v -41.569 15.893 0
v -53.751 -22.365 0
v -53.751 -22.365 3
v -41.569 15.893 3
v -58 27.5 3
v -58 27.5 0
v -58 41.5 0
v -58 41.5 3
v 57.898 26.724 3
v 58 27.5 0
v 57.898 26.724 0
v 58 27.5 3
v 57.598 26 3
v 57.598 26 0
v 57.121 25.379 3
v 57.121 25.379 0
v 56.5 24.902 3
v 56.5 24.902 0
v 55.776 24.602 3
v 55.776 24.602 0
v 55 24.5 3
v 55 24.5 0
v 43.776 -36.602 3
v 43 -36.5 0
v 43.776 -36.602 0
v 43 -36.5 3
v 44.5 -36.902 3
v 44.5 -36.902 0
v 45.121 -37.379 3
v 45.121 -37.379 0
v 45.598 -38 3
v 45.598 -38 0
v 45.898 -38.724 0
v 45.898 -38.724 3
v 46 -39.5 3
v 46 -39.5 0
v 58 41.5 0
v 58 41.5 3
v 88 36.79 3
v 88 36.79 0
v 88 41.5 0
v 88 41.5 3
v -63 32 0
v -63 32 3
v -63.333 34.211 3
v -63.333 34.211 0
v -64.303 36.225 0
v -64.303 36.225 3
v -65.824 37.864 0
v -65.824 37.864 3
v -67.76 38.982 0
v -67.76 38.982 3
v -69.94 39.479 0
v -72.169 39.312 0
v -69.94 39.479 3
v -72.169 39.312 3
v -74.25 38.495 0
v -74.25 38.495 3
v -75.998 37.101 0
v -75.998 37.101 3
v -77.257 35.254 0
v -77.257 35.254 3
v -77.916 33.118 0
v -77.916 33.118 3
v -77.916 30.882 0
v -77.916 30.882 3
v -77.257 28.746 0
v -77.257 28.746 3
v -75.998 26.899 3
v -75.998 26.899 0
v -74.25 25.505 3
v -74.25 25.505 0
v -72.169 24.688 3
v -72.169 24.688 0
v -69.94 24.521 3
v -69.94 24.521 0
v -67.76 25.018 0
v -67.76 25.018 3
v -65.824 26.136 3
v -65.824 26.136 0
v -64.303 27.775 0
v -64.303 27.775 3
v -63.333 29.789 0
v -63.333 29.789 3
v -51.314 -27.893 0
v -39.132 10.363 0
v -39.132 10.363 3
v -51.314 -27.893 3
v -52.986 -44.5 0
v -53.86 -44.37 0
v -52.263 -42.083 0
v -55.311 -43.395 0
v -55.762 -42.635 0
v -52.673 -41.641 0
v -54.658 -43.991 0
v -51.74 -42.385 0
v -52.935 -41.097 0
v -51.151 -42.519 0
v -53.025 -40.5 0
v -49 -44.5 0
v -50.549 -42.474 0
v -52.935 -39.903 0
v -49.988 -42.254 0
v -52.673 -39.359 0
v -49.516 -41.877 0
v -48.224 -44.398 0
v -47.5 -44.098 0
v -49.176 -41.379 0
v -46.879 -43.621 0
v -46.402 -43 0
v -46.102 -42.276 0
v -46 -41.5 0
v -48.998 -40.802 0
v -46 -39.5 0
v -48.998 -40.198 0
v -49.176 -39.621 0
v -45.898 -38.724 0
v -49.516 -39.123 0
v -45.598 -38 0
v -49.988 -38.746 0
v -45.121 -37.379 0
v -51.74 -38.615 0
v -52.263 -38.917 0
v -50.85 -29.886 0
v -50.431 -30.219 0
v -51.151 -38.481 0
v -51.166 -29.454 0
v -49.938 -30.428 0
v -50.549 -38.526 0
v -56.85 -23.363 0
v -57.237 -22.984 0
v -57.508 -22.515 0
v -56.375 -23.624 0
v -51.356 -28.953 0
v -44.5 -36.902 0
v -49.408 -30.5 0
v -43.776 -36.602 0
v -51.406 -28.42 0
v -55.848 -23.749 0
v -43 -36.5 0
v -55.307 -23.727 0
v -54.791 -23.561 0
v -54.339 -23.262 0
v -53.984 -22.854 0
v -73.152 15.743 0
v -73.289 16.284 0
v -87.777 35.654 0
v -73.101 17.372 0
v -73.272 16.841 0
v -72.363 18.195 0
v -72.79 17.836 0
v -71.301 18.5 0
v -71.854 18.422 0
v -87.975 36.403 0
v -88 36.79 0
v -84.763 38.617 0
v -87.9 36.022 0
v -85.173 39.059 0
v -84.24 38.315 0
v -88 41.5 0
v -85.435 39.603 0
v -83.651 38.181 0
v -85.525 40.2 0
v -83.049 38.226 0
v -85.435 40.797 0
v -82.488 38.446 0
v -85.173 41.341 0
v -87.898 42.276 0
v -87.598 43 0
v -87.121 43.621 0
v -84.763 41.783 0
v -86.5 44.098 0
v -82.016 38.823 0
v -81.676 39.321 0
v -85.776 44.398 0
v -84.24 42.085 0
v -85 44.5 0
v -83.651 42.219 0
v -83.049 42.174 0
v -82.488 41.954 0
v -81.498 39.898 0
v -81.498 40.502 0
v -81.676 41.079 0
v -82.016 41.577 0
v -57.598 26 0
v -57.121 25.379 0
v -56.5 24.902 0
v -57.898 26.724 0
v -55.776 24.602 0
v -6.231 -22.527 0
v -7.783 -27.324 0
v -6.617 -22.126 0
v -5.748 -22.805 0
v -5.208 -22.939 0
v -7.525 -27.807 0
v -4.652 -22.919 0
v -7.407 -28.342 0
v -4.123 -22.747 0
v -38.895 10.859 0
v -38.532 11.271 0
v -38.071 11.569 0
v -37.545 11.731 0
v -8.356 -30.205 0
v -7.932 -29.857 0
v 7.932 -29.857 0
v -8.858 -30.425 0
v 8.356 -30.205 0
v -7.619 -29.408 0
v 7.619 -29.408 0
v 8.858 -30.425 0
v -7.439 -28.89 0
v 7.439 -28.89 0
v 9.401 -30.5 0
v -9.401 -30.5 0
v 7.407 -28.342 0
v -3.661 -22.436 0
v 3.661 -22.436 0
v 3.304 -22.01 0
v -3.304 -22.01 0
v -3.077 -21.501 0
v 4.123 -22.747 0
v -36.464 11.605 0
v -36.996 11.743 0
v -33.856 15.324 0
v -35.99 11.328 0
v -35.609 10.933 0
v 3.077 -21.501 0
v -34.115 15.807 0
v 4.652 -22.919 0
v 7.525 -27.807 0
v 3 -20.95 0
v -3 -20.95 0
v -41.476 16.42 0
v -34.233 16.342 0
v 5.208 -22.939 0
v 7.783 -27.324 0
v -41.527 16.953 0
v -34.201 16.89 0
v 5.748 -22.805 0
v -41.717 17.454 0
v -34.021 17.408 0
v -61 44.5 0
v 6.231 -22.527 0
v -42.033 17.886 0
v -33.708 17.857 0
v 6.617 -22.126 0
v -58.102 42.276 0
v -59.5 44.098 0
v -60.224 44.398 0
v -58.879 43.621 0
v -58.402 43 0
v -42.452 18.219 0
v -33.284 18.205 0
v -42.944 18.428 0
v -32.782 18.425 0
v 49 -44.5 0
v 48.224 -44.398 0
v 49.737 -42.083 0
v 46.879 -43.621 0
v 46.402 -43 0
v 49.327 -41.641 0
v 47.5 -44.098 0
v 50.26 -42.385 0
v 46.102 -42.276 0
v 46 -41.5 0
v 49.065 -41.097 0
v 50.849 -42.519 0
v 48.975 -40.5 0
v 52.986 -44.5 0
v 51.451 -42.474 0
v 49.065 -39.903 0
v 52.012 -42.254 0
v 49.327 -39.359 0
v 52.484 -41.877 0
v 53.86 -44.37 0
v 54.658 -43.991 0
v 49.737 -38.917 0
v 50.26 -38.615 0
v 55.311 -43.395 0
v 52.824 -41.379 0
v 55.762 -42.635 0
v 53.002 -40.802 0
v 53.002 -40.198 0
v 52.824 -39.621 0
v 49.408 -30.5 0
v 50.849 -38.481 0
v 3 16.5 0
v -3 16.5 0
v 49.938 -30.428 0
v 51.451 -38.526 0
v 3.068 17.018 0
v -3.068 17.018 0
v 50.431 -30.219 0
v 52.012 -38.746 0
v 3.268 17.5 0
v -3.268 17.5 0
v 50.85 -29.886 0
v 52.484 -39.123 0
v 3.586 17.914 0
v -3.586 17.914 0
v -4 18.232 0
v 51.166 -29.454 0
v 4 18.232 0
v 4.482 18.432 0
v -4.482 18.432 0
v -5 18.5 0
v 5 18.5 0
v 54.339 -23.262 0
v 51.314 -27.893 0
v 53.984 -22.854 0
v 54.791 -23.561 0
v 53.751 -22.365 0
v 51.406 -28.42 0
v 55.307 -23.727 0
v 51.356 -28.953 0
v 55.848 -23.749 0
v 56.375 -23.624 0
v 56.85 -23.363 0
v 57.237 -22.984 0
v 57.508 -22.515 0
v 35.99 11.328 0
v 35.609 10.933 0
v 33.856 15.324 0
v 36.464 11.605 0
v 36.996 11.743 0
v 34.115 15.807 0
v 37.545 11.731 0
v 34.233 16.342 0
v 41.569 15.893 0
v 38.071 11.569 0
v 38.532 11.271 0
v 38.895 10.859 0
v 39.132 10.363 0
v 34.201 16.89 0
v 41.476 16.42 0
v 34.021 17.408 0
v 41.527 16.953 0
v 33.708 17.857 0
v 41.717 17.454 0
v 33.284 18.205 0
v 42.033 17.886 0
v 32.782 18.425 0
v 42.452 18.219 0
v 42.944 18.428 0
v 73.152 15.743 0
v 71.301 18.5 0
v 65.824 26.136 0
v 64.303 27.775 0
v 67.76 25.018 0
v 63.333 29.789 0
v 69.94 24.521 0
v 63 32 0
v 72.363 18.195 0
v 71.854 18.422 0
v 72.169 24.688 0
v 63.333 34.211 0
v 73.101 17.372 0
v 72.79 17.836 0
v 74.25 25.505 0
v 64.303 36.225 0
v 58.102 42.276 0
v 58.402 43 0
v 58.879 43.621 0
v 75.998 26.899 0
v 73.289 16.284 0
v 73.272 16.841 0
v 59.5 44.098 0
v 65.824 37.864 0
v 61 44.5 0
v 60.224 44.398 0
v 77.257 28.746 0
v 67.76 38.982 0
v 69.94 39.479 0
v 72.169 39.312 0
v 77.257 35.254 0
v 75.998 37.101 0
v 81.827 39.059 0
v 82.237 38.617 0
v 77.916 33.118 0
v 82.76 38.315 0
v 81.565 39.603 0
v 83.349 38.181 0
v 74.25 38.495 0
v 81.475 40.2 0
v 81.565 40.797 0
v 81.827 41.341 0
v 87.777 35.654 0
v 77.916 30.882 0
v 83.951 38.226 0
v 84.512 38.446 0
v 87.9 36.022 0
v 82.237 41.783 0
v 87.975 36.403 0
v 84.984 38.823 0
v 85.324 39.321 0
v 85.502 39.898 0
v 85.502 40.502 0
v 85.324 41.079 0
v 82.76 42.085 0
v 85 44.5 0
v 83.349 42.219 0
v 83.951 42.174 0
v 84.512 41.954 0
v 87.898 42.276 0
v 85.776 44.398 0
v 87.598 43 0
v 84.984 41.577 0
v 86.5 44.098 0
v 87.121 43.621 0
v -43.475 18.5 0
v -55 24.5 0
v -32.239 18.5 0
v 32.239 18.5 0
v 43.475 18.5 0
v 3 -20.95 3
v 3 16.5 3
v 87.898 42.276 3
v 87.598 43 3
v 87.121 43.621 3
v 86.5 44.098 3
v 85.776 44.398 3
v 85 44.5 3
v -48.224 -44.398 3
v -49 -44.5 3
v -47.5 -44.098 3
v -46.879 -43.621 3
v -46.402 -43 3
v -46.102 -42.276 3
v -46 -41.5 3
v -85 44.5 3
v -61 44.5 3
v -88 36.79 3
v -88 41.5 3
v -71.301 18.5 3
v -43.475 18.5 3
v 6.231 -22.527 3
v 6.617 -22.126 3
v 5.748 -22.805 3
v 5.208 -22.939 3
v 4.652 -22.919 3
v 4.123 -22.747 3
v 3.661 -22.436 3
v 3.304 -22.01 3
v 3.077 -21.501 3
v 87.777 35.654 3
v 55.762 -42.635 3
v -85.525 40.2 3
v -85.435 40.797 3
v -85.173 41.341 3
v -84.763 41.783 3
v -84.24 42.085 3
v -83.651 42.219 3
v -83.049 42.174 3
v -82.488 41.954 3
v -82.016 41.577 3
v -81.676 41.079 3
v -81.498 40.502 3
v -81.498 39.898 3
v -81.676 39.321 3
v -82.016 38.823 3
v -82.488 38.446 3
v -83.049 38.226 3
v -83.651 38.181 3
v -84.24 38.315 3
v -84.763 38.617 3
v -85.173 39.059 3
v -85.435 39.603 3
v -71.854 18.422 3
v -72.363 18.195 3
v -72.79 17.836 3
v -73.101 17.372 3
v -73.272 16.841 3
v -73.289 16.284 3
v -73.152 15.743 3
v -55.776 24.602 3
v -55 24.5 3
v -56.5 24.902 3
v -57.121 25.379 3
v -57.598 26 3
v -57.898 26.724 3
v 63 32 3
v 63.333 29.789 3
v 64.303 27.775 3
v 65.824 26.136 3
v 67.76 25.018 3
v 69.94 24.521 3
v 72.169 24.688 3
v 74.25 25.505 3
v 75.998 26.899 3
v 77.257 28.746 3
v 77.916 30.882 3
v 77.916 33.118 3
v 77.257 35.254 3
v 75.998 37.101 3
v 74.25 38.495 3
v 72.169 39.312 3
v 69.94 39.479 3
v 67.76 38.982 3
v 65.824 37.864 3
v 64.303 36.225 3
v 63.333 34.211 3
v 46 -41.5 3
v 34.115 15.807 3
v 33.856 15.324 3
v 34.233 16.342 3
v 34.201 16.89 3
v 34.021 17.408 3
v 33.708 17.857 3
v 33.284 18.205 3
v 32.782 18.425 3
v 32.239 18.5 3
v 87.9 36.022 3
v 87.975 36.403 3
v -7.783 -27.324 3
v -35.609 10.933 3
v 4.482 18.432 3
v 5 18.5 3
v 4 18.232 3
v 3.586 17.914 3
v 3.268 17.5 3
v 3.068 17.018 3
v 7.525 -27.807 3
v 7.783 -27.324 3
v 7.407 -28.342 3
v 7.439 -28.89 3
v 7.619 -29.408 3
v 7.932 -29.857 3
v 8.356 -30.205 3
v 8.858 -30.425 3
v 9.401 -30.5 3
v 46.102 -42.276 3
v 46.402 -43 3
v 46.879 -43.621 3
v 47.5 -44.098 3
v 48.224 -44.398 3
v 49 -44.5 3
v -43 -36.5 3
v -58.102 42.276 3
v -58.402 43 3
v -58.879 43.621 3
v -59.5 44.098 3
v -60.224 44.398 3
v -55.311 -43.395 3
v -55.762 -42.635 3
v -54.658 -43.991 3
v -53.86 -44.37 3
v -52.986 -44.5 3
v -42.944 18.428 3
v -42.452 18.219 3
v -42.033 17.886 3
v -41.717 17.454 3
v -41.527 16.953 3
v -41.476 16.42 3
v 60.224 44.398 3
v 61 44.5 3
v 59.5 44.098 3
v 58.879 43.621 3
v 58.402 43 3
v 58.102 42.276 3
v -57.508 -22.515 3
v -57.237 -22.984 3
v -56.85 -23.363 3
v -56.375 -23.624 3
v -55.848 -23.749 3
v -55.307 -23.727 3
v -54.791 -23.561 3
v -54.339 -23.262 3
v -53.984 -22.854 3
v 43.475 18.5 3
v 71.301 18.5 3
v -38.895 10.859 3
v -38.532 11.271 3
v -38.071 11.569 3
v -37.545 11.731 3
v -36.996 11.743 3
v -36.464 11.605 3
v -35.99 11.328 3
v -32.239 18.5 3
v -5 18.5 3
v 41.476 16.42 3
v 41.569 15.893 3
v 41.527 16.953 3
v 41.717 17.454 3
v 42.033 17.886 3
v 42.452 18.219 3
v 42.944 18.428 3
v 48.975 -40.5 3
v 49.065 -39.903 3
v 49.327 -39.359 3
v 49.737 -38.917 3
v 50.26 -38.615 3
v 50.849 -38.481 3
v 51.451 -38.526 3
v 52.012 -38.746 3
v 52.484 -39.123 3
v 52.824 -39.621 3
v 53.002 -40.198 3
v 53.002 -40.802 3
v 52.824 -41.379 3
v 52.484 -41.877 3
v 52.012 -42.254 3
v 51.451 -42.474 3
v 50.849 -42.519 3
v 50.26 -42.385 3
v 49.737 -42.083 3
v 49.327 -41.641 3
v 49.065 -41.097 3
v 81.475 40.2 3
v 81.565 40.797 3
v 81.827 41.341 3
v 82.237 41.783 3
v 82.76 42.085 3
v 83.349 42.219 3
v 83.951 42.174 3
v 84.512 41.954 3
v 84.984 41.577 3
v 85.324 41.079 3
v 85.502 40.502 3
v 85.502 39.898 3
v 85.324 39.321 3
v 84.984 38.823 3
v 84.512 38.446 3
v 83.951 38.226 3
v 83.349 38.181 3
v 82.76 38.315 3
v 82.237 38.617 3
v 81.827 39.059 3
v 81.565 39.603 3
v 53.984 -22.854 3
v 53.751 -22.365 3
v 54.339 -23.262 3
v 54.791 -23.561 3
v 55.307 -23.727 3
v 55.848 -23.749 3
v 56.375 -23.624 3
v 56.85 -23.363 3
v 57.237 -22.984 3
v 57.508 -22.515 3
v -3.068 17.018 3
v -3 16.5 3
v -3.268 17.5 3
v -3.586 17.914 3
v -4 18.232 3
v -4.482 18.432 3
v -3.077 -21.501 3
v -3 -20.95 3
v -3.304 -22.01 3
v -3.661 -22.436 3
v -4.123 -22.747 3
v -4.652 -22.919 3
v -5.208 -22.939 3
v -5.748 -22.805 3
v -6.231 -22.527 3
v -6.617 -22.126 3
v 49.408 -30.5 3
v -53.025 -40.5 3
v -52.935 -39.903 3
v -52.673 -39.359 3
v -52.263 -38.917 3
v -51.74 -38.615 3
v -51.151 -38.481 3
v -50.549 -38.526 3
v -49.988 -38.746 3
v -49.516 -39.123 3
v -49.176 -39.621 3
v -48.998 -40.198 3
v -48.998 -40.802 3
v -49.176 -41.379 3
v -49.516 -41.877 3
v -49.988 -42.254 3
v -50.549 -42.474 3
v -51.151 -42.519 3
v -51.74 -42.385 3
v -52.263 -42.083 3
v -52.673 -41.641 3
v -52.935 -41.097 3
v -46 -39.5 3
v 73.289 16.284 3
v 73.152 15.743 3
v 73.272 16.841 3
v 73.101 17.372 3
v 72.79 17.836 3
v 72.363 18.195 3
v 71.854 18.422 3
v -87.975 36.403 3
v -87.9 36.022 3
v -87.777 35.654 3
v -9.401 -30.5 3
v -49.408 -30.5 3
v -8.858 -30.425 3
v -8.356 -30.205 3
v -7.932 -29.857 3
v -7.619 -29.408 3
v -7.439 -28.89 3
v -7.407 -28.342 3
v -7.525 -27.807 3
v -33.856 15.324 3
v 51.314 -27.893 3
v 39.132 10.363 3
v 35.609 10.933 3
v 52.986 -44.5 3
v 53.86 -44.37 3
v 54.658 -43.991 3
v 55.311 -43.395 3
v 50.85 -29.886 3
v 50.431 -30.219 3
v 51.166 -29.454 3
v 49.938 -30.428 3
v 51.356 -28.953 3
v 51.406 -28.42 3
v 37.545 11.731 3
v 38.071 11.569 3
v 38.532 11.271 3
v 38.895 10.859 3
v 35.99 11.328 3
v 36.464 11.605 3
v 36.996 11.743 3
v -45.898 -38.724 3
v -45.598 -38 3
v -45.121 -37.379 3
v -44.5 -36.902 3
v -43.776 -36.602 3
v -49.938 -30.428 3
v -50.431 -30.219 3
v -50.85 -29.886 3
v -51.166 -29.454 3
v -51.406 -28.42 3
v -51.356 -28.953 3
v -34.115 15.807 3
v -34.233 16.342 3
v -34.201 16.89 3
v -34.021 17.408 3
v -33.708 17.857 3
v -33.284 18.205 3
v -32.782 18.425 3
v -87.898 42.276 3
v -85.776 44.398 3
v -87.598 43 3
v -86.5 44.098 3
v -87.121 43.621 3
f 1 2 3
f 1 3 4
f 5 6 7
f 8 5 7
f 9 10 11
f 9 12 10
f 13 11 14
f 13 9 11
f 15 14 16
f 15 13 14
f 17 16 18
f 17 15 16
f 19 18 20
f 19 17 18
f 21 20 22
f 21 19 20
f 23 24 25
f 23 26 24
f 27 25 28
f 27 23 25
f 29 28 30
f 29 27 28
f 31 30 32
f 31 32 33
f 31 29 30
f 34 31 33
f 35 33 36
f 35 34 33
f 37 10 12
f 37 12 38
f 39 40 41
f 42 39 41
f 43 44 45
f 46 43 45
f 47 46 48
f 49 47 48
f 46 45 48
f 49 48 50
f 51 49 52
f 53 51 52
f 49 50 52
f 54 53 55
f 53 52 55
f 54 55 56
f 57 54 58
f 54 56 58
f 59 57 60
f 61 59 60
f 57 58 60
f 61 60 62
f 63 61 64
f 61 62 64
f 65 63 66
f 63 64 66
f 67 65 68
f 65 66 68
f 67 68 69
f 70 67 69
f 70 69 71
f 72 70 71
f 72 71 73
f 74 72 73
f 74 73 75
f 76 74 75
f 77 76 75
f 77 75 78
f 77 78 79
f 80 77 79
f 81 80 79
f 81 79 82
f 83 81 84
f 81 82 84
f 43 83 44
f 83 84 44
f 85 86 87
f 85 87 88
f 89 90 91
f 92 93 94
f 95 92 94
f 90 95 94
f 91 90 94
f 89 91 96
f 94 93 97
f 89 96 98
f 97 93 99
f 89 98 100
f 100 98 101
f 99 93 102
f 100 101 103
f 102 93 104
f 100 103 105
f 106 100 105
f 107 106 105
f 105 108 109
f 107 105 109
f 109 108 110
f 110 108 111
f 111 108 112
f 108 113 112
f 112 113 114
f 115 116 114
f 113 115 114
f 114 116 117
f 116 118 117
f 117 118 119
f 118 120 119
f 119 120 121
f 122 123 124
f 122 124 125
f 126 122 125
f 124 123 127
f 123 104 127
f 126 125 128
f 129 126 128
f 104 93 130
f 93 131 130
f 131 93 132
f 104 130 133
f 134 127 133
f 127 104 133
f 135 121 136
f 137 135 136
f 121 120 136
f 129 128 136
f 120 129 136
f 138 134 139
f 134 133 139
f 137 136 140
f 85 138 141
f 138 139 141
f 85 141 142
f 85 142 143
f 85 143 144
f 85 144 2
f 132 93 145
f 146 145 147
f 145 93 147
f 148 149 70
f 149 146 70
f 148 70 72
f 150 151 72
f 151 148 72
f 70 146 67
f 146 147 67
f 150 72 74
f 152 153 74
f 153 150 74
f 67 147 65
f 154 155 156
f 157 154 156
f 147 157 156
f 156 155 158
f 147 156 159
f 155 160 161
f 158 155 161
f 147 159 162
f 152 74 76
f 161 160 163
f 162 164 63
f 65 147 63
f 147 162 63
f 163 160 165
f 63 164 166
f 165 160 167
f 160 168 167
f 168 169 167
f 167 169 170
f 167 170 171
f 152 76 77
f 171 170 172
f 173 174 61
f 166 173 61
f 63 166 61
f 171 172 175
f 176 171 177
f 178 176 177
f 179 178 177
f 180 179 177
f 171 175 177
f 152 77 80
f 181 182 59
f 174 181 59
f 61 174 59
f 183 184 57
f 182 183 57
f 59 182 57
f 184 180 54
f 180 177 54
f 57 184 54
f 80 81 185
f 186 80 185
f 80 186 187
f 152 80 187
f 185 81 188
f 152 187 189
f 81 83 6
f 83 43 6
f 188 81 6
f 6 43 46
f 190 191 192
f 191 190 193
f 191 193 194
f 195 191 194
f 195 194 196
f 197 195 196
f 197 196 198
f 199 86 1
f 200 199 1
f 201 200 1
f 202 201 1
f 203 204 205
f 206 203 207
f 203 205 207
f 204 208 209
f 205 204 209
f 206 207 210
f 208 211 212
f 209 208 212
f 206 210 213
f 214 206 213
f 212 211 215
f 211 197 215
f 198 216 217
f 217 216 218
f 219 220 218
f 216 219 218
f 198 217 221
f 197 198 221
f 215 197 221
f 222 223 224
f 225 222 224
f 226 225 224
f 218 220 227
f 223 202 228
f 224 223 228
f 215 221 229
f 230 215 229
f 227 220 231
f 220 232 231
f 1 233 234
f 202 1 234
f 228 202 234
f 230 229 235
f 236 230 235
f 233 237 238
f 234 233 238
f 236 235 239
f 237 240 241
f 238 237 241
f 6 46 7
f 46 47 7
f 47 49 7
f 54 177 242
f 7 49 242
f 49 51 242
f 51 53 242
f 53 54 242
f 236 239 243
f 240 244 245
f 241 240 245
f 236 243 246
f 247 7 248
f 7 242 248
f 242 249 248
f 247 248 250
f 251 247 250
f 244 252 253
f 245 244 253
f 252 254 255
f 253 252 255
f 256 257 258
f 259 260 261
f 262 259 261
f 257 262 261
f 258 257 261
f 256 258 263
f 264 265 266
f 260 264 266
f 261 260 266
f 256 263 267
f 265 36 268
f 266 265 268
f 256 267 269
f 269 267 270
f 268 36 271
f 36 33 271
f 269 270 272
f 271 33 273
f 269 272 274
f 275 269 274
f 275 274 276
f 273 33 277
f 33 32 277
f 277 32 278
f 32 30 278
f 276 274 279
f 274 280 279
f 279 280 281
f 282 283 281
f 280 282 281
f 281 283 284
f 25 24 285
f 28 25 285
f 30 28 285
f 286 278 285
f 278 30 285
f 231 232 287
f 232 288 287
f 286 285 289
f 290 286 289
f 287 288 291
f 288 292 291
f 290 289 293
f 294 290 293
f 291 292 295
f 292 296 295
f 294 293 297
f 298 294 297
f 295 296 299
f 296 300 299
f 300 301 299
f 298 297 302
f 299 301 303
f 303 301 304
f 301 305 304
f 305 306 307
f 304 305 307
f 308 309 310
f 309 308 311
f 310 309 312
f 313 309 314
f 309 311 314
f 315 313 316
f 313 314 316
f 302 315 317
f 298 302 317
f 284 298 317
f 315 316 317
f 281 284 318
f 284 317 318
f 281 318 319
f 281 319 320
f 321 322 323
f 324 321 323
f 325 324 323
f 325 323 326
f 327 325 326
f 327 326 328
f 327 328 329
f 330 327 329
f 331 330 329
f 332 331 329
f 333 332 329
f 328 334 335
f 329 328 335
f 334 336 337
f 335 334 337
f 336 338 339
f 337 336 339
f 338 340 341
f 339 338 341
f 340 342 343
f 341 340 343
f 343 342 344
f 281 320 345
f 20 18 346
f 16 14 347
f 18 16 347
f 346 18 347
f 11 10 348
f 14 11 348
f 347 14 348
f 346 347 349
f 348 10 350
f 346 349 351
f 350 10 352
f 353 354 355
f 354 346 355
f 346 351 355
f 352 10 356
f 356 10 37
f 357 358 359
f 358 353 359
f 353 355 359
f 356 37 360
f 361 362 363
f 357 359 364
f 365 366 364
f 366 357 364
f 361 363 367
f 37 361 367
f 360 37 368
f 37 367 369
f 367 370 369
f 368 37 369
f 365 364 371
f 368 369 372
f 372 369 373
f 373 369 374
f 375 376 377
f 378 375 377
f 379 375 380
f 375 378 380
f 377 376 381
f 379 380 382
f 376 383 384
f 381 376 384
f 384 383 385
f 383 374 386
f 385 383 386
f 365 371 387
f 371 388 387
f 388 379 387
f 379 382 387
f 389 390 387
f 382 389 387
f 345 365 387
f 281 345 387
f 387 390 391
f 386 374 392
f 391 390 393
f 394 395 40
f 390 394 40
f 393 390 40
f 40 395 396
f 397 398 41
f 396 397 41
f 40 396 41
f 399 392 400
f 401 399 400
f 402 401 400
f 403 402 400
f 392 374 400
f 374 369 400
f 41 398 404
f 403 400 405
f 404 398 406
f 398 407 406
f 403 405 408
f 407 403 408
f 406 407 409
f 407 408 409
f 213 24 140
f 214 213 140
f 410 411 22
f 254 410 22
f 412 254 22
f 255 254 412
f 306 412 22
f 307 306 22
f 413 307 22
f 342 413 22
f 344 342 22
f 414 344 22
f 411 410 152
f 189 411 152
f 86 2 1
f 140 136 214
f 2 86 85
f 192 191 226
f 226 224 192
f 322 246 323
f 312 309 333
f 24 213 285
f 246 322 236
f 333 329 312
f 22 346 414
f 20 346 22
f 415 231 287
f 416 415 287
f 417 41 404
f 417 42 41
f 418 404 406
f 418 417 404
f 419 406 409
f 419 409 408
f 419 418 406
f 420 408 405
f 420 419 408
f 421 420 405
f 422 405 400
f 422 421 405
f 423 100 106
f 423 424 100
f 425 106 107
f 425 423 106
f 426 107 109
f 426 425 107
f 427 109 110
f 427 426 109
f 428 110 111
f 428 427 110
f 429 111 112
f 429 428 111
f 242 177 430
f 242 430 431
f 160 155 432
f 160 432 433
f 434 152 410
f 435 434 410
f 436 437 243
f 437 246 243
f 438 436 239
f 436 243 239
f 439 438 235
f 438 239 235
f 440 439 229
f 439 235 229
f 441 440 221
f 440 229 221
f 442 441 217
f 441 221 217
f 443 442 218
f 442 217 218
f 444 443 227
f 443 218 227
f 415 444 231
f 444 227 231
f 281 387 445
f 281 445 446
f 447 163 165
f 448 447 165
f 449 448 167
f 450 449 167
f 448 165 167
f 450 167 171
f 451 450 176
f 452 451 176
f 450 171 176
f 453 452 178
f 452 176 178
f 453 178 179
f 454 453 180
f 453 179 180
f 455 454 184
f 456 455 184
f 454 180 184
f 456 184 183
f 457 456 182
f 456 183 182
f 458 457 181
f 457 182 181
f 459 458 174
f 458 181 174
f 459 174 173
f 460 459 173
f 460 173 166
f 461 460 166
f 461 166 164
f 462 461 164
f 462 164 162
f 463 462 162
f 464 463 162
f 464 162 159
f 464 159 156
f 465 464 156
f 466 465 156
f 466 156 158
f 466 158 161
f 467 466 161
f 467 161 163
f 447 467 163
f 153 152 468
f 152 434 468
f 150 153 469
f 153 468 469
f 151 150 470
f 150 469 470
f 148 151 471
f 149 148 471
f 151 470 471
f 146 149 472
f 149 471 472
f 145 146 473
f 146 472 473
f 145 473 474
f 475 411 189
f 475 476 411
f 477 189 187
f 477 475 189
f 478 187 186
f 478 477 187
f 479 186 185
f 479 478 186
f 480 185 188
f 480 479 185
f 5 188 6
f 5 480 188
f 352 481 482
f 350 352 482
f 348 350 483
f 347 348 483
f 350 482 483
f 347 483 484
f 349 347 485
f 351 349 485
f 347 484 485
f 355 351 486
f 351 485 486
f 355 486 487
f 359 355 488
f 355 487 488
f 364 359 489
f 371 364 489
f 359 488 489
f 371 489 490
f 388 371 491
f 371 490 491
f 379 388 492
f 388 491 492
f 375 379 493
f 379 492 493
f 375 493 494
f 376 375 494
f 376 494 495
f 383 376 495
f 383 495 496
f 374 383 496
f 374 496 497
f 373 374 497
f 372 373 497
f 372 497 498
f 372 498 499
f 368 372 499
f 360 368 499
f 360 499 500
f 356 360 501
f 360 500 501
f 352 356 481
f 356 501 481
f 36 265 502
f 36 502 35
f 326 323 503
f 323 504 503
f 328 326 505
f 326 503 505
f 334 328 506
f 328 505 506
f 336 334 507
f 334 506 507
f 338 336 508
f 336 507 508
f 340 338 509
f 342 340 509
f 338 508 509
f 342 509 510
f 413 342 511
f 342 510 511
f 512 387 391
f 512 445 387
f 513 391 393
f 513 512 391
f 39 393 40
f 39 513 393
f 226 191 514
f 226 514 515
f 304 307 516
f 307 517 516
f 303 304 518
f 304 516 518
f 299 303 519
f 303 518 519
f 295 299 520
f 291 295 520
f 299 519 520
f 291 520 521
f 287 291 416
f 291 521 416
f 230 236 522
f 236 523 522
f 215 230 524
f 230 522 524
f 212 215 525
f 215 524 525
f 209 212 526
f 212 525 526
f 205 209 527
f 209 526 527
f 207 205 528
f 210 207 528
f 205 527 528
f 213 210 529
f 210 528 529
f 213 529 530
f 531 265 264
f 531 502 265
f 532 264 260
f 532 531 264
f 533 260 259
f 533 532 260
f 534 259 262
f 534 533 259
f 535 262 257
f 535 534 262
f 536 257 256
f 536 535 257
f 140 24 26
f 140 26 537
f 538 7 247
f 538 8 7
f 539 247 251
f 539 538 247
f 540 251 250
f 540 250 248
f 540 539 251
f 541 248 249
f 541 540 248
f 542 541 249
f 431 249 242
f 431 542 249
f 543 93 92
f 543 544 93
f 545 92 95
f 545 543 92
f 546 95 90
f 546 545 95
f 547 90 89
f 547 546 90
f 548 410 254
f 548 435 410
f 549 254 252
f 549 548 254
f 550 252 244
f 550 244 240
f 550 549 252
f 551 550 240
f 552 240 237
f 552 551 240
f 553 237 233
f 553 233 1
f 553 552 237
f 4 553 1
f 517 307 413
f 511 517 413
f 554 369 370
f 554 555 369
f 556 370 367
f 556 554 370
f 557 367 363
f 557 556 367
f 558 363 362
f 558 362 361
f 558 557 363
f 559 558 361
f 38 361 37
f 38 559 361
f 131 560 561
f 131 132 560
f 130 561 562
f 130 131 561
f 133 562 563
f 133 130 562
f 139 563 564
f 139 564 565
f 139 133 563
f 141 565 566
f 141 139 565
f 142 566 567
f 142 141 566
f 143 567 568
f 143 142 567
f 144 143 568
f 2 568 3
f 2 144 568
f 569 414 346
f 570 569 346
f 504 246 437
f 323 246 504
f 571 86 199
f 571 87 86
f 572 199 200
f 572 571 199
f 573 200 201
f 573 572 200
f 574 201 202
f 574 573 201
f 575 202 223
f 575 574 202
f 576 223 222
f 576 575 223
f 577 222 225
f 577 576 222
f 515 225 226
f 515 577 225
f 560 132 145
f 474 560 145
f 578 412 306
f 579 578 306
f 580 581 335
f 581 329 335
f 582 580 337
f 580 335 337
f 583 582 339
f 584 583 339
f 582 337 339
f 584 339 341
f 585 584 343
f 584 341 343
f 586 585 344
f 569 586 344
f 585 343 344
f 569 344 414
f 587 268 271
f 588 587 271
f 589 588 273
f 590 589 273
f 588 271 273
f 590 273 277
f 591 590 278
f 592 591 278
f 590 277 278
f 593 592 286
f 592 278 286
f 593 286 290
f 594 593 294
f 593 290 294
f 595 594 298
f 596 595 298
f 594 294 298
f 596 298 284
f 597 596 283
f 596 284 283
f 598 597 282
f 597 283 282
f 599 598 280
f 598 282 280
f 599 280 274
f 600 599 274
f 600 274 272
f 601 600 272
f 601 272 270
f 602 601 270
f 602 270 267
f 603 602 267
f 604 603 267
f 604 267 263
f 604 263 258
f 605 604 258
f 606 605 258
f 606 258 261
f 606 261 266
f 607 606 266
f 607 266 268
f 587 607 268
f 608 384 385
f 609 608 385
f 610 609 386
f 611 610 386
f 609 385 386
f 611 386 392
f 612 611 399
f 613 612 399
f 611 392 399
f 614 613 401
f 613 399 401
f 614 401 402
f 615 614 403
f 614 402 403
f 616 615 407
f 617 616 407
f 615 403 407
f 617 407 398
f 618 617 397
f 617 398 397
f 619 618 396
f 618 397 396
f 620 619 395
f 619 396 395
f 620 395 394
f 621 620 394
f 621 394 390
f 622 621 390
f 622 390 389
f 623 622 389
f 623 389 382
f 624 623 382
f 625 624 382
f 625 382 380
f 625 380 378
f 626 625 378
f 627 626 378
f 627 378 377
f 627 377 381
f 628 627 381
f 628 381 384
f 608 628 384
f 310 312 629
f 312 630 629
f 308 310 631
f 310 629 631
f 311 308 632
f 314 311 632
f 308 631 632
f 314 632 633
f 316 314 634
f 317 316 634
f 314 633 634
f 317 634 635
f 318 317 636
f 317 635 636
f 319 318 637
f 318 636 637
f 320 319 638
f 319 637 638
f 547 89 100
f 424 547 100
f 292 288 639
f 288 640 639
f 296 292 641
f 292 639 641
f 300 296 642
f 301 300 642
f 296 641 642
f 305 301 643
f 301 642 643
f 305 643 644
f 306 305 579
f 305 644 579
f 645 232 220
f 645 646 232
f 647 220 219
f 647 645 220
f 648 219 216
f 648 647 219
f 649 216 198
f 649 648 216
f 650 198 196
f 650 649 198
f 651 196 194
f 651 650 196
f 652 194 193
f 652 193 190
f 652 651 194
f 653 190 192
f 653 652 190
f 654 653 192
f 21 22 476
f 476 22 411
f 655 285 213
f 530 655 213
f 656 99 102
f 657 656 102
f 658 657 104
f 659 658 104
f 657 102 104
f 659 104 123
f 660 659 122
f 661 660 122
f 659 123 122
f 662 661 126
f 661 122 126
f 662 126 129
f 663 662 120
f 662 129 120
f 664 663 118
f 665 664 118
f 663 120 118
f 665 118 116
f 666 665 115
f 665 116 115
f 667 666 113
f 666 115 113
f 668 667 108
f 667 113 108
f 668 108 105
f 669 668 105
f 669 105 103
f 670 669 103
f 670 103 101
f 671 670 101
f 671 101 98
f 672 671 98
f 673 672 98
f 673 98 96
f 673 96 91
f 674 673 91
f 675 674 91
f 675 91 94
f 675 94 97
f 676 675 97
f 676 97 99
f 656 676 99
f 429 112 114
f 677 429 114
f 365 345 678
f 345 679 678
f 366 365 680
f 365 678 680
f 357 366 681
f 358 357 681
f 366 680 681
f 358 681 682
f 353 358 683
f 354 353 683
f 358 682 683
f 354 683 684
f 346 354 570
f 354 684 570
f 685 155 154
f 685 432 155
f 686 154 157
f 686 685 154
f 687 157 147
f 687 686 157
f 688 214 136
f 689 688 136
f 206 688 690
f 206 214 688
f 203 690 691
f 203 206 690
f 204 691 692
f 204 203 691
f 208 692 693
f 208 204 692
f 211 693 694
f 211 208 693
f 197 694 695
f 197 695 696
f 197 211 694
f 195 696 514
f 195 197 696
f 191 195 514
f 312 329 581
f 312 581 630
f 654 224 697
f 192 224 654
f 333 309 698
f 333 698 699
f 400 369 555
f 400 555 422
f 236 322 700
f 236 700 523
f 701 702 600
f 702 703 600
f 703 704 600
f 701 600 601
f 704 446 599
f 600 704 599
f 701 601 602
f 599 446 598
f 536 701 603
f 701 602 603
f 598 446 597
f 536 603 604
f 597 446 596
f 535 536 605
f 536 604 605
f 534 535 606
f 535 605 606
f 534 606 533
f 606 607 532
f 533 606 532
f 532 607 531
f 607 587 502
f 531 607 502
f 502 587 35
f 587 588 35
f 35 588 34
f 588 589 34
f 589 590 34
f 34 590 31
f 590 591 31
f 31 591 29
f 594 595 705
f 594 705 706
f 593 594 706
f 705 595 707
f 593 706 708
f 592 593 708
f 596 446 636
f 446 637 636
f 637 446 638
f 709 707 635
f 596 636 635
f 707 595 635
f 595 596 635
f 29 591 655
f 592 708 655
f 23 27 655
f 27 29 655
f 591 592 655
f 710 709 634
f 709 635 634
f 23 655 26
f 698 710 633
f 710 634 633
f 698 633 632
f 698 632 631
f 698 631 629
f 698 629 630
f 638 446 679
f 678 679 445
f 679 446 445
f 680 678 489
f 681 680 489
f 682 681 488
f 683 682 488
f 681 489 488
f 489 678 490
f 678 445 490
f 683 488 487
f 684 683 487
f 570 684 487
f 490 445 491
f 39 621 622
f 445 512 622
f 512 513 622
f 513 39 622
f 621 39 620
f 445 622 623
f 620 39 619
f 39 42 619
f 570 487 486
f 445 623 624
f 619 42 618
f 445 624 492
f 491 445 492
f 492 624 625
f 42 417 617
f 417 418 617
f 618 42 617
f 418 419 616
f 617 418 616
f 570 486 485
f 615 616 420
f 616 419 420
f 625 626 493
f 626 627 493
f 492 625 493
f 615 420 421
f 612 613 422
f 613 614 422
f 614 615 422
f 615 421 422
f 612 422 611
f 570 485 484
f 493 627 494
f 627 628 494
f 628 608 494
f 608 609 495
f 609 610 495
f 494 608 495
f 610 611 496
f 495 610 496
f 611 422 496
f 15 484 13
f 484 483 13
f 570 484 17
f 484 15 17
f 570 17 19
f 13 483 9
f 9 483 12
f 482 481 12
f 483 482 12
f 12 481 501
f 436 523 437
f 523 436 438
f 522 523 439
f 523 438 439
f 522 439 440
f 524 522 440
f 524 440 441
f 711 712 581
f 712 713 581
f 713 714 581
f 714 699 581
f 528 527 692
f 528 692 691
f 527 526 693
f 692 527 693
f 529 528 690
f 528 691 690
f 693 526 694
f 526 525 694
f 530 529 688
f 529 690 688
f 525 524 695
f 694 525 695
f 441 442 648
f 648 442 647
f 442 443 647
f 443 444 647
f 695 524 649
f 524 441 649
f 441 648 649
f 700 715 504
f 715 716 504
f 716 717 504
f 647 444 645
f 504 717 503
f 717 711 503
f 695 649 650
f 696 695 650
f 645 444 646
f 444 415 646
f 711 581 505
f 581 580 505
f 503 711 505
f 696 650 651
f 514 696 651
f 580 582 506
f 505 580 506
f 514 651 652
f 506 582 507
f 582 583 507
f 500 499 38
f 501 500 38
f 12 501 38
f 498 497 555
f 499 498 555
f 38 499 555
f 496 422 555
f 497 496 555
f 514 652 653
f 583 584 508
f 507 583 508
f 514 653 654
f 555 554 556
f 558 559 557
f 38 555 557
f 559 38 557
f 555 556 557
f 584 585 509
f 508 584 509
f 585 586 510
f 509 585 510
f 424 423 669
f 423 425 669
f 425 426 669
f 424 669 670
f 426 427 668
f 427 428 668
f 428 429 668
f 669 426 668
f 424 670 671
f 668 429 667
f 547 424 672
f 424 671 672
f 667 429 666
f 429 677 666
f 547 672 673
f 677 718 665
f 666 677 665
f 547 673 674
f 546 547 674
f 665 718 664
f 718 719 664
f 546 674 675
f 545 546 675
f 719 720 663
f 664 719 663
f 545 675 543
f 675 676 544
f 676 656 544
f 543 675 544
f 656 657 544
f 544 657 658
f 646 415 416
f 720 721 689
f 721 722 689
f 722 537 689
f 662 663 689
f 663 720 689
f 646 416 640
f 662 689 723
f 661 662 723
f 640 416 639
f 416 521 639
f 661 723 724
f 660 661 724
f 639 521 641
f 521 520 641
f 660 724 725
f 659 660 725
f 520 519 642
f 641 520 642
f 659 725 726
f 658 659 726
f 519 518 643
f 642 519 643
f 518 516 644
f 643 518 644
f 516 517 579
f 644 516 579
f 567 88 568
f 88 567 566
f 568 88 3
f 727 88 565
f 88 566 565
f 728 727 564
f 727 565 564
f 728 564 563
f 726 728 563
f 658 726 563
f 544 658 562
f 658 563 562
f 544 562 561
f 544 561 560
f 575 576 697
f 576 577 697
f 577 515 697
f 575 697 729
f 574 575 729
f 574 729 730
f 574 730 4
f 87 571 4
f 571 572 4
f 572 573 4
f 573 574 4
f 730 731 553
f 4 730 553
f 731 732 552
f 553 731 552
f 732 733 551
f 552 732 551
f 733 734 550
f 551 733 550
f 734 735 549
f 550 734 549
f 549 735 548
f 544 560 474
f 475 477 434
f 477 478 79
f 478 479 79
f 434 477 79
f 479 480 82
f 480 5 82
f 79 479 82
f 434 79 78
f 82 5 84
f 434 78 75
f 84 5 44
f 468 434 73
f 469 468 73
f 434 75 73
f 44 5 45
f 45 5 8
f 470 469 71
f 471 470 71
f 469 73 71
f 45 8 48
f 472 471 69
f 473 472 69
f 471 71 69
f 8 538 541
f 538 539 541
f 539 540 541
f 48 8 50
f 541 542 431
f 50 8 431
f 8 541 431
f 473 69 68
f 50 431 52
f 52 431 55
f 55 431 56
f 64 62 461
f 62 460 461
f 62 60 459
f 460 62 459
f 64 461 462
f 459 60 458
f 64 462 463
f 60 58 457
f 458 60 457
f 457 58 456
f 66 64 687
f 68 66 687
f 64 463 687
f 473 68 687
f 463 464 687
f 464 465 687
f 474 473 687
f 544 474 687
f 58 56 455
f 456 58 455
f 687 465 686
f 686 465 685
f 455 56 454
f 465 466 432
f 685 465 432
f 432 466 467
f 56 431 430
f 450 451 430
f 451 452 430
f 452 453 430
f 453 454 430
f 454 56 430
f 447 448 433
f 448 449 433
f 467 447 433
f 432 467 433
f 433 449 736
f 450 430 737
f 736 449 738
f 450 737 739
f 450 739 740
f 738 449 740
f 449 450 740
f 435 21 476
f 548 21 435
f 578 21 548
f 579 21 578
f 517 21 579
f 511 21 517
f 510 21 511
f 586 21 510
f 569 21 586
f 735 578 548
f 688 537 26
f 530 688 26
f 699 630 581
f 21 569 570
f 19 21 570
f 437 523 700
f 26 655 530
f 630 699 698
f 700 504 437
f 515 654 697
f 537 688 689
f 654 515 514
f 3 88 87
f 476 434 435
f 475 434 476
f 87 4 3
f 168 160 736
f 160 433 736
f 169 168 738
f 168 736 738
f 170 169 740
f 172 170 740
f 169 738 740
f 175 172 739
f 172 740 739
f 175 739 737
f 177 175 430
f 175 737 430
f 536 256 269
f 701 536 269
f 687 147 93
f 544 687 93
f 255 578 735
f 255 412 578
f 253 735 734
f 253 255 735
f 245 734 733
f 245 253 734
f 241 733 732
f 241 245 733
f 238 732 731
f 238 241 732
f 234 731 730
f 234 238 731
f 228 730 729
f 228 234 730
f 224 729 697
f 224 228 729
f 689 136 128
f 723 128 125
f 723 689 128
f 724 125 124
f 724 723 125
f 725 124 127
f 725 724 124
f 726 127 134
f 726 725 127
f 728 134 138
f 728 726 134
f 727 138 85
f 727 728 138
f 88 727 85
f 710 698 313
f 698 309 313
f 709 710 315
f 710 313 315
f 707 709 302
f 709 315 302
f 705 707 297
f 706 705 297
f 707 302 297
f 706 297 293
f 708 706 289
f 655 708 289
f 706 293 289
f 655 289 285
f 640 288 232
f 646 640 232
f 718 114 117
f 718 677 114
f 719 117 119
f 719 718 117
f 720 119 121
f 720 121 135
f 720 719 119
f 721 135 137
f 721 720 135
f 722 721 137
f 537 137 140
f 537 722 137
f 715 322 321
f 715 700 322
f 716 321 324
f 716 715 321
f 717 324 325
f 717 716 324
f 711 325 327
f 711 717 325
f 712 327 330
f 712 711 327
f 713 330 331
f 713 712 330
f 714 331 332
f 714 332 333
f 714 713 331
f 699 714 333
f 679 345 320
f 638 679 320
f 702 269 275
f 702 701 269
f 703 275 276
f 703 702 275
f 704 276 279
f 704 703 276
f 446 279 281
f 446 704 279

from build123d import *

# Parameters (mm, degrees)
SKETCH_1_W          = 176
SKETCH_1_H          = 89
EXTRUDE_1_DEPTH     = 3
SKETCH_2_R          = 2.025
CUT_EXTRUDE_1_DEPTH = 4
CUT_EXTRUDE_2_DEPTH = 4
SKETCH_4_W          = 116
SKETCH_4_H          = 40
CUT_EXTRUDE_3_DEPTH = 4
SKETCH_5_W          = 92
SKETCH_5_H          = 16
CUT_EXTRUDE_4_DEPTH = 4
CUT_EXTRUDE_5_DEPTH = 24
EXTRUDE_2_DEPTH     = 3
FILLET_1_R          = 2
FILLET_2_R          = 3
SKETCH_8_R          = 7.5
CUT_EXTRUDE_6_DEPTH = 3


with BuildPart() as part:
    # 草图1 → 凸台-拉伸1 (new body)
    with BuildSketch(Plane.XY):
        Rectangle(SKETCH_1_W, SKETCH_1_H)
    extrude(amount=EXTRUDE_1_DEPTH)

    # 草图2 → 切除-拉伸1 (cut)
    with BuildSketch(Plane(origin=(0, 0, 0), x_dir=(-1, 0, 0), z_dir=(0, 0, -1))):
        with Locations((-83.5, 40.2)):
            Circle(SKETCH_2_R)
        with Locations((83.5, 40.2)):
            Circle(SKETCH_2_R)
        with Locations((51, -40.5)):
            Circle(SKETCH_2_R)
        with Locations((-51, -40.5)):
            Circle(SKETCH_2_R)
    extrude(amount=-CUT_EXTRUDE_1_DEPTH, mode=Mode.SUBTRACT)

    # 草图3 → 切除-拉伸2 (cut)
    with BuildSketch(Plane(origin=(0, 0, 0), x_dir=(-1, 0, 0), z_dir=(0, 0, -1))):
        Polygon((88, -44.5), (88, 36.2), (55, -44.5), align=None)
        Polygon((-88, 36.2), (-55, -44.5), (-88, -44.5), align=None)
    extrude(amount=-CUT_EXTRUDE_2_DEPTH, mode=Mode.SUBTRACT)

    # 草图4 → 切除-拉伸3 (cut)
    with BuildSketch(Plane(origin=(0, 0, 0), x_dir=(-1, 0, 0), z_dir=(0, 0, -1))):
        with Locations((0, 44.5)):
            Rectangle(SKETCH_4_W, SKETCH_4_H)
    extrude(amount=-CUT_EXTRUDE_3_DEPTH, mode=Mode.SUBTRACT)

    # 草图5 → 切除-拉伸4 (cut)
    with BuildSketch(Plane(origin=(0, 0, 0), x_dir=(-1, 0, 0), z_dir=(0, 0, -1))):
        with Locations((0, -44.5)):
            Rectangle(SKETCH_5_W, SKETCH_5_H)
    extrude(amount=-CUT_EXTRUDE_4_DEPTH, mode=Mode.SUBTRACT)

    # 草图6 → 切除-拉伸5 (cut)
    with BuildSketch(Plane(origin=(0, 0, 0), x_dir=(-1, 0, 0), z_dir=(0, 0, -1))):
        Polygon((-3, 18.5), (-74.279812328, 18.5), (-54.242637607, -30.5), (-3, -30.5), align=None)
        Polygon((74.279812328, 18.5), (3, 18.5), (3, -30.5), (54.242637607, -30.5), align=None)
    extrude(amount=-CUT_EXTRUDE_5_DEPTH, mode=Mode.SUBTRACT)

    # 草图7 → 凸台-拉伸2 (add)
    with BuildSketch(Plane(origin=(0, 0, 0), x_dir=(-1, 0, 0), z_dir=(0, 0, -1))):
        with BuildLine():
            Line((-52.336918942, -31.106824827), (-37.933084046, 14.128069622))
            Line((-37.933084046, 14.128069622), (-4.617416544, -31.676419875))
            ThreePointArc((-4.617416544, -31.676419875), (-1.823580125, -32.117416544), (-1.382583456, -29.323580125))
            Line((-1.382583456, -29.323580125), (-39.346728283, 22.871930378))
            Line((-39.346728283, 22.871930378), (-56.148356272, -29.893175173))
            ThreePointArc((-56.148356272, -29.893175173), (-54.849462434, -32.405718665), (-52.336918942, -31.106824827))
        make_face()
        with BuildLine():
            Line((4.617416544, -31.676419875), (37.933084046, 14.128069622))
            Line((37.933084046, 14.128069622), (52.336918942, -31.106824827))
            ThreePointArc((52.336918942, -31.106824827), (54.849462434, -32.405718665), (56.148356272, -29.893175173))
            Line((56.148356272, -29.893175173), (39.346728283, 22.871930378))
            Line((39.346728283, 22.871930378), (1.382583456, -29.323580125))
            ThreePointArc((1.382583456, -29.323580125), (1.823580125, -32.117416544), (4.617416544, -31.676419875))
        make_face()
    extrude(amount=-EXTRUDE_2_DEPTH)

    # 圆角1
    fillet_1_edges = [part.edges().sort_by_distance(p)[0] for p in [
        (3, 18.5, 1.5),
        (74.279812328, 18.5, 1.5),
        (-3, 18.5, 1.5),
        (-74.279812328, 18.5, 1.5),
        (36.166826478, 18.5, 1.5),
        (40.738851866, 18.5, 1.5),
        (52.143691905, -30.5, 1.5),
        (5.473079686, -30.5, 1.5),
        (37.933084046, 14.128069622, 1.5),
        (55.422689585, -27.614236527, 1.5),
        (3, -27.099853432, 1.5),
        (-3, -27.099853432, 1.5),
        (-5.473079686, -30.5, 1.5),
        (-52.143691905, -30.5, 1.5),
        (-55.422689585, -27.614236527, 1.5),
        (-40.738851866, 18.5, 1.5),
        (-37.933084046, 14.128069622, 1.5),
        (-36.166826478, 18.5, 1.5),
    ]]
    fillet(fillet_1_edges, radius=FILLET_1_R)

    # 圆角2
    fillet_2_edges = [part.edges().sort_by_distance(p)[0] for p in [
        (88, 36.2, 1.5),
        (55, -44.5, 1.5),
        (-55, -44.5, 1.5),
        (-88, 36.2, 1.5),
        (-58, 44.5, 1.5),
        (-58, 24.5, 1.5),
        (58, 44.5, 1.5),
        (58, 24.5, 1.5),
        (-88, 44.5, 1.5),
        (88, 44.5, 1.5),
        (-46, -44.5, 1.5),
        (-46, -36.5, 1.5),
        (46, -44.5, 1.5),
        (46, -36.5, 1.5),
    ]]
    fillet(fillet_2_edges, radius=FILLET_2_R)

    # 草图8 → 切除-拉伸6 (cut)
    with BuildSketch(Plane.XY.offset(3)):
        with Locations((-70.5, 32)):
            Circle(SKETCH_8_R)
        with Locations(Location((70.5, 32, 0), (0, 0, 180))):
            Circle(SKETCH_8_R)
    extrude(amount=-CUT_EXTRUDE_6_DEPTH, mode=Mode.SUBTRACT)


solid = part.part
